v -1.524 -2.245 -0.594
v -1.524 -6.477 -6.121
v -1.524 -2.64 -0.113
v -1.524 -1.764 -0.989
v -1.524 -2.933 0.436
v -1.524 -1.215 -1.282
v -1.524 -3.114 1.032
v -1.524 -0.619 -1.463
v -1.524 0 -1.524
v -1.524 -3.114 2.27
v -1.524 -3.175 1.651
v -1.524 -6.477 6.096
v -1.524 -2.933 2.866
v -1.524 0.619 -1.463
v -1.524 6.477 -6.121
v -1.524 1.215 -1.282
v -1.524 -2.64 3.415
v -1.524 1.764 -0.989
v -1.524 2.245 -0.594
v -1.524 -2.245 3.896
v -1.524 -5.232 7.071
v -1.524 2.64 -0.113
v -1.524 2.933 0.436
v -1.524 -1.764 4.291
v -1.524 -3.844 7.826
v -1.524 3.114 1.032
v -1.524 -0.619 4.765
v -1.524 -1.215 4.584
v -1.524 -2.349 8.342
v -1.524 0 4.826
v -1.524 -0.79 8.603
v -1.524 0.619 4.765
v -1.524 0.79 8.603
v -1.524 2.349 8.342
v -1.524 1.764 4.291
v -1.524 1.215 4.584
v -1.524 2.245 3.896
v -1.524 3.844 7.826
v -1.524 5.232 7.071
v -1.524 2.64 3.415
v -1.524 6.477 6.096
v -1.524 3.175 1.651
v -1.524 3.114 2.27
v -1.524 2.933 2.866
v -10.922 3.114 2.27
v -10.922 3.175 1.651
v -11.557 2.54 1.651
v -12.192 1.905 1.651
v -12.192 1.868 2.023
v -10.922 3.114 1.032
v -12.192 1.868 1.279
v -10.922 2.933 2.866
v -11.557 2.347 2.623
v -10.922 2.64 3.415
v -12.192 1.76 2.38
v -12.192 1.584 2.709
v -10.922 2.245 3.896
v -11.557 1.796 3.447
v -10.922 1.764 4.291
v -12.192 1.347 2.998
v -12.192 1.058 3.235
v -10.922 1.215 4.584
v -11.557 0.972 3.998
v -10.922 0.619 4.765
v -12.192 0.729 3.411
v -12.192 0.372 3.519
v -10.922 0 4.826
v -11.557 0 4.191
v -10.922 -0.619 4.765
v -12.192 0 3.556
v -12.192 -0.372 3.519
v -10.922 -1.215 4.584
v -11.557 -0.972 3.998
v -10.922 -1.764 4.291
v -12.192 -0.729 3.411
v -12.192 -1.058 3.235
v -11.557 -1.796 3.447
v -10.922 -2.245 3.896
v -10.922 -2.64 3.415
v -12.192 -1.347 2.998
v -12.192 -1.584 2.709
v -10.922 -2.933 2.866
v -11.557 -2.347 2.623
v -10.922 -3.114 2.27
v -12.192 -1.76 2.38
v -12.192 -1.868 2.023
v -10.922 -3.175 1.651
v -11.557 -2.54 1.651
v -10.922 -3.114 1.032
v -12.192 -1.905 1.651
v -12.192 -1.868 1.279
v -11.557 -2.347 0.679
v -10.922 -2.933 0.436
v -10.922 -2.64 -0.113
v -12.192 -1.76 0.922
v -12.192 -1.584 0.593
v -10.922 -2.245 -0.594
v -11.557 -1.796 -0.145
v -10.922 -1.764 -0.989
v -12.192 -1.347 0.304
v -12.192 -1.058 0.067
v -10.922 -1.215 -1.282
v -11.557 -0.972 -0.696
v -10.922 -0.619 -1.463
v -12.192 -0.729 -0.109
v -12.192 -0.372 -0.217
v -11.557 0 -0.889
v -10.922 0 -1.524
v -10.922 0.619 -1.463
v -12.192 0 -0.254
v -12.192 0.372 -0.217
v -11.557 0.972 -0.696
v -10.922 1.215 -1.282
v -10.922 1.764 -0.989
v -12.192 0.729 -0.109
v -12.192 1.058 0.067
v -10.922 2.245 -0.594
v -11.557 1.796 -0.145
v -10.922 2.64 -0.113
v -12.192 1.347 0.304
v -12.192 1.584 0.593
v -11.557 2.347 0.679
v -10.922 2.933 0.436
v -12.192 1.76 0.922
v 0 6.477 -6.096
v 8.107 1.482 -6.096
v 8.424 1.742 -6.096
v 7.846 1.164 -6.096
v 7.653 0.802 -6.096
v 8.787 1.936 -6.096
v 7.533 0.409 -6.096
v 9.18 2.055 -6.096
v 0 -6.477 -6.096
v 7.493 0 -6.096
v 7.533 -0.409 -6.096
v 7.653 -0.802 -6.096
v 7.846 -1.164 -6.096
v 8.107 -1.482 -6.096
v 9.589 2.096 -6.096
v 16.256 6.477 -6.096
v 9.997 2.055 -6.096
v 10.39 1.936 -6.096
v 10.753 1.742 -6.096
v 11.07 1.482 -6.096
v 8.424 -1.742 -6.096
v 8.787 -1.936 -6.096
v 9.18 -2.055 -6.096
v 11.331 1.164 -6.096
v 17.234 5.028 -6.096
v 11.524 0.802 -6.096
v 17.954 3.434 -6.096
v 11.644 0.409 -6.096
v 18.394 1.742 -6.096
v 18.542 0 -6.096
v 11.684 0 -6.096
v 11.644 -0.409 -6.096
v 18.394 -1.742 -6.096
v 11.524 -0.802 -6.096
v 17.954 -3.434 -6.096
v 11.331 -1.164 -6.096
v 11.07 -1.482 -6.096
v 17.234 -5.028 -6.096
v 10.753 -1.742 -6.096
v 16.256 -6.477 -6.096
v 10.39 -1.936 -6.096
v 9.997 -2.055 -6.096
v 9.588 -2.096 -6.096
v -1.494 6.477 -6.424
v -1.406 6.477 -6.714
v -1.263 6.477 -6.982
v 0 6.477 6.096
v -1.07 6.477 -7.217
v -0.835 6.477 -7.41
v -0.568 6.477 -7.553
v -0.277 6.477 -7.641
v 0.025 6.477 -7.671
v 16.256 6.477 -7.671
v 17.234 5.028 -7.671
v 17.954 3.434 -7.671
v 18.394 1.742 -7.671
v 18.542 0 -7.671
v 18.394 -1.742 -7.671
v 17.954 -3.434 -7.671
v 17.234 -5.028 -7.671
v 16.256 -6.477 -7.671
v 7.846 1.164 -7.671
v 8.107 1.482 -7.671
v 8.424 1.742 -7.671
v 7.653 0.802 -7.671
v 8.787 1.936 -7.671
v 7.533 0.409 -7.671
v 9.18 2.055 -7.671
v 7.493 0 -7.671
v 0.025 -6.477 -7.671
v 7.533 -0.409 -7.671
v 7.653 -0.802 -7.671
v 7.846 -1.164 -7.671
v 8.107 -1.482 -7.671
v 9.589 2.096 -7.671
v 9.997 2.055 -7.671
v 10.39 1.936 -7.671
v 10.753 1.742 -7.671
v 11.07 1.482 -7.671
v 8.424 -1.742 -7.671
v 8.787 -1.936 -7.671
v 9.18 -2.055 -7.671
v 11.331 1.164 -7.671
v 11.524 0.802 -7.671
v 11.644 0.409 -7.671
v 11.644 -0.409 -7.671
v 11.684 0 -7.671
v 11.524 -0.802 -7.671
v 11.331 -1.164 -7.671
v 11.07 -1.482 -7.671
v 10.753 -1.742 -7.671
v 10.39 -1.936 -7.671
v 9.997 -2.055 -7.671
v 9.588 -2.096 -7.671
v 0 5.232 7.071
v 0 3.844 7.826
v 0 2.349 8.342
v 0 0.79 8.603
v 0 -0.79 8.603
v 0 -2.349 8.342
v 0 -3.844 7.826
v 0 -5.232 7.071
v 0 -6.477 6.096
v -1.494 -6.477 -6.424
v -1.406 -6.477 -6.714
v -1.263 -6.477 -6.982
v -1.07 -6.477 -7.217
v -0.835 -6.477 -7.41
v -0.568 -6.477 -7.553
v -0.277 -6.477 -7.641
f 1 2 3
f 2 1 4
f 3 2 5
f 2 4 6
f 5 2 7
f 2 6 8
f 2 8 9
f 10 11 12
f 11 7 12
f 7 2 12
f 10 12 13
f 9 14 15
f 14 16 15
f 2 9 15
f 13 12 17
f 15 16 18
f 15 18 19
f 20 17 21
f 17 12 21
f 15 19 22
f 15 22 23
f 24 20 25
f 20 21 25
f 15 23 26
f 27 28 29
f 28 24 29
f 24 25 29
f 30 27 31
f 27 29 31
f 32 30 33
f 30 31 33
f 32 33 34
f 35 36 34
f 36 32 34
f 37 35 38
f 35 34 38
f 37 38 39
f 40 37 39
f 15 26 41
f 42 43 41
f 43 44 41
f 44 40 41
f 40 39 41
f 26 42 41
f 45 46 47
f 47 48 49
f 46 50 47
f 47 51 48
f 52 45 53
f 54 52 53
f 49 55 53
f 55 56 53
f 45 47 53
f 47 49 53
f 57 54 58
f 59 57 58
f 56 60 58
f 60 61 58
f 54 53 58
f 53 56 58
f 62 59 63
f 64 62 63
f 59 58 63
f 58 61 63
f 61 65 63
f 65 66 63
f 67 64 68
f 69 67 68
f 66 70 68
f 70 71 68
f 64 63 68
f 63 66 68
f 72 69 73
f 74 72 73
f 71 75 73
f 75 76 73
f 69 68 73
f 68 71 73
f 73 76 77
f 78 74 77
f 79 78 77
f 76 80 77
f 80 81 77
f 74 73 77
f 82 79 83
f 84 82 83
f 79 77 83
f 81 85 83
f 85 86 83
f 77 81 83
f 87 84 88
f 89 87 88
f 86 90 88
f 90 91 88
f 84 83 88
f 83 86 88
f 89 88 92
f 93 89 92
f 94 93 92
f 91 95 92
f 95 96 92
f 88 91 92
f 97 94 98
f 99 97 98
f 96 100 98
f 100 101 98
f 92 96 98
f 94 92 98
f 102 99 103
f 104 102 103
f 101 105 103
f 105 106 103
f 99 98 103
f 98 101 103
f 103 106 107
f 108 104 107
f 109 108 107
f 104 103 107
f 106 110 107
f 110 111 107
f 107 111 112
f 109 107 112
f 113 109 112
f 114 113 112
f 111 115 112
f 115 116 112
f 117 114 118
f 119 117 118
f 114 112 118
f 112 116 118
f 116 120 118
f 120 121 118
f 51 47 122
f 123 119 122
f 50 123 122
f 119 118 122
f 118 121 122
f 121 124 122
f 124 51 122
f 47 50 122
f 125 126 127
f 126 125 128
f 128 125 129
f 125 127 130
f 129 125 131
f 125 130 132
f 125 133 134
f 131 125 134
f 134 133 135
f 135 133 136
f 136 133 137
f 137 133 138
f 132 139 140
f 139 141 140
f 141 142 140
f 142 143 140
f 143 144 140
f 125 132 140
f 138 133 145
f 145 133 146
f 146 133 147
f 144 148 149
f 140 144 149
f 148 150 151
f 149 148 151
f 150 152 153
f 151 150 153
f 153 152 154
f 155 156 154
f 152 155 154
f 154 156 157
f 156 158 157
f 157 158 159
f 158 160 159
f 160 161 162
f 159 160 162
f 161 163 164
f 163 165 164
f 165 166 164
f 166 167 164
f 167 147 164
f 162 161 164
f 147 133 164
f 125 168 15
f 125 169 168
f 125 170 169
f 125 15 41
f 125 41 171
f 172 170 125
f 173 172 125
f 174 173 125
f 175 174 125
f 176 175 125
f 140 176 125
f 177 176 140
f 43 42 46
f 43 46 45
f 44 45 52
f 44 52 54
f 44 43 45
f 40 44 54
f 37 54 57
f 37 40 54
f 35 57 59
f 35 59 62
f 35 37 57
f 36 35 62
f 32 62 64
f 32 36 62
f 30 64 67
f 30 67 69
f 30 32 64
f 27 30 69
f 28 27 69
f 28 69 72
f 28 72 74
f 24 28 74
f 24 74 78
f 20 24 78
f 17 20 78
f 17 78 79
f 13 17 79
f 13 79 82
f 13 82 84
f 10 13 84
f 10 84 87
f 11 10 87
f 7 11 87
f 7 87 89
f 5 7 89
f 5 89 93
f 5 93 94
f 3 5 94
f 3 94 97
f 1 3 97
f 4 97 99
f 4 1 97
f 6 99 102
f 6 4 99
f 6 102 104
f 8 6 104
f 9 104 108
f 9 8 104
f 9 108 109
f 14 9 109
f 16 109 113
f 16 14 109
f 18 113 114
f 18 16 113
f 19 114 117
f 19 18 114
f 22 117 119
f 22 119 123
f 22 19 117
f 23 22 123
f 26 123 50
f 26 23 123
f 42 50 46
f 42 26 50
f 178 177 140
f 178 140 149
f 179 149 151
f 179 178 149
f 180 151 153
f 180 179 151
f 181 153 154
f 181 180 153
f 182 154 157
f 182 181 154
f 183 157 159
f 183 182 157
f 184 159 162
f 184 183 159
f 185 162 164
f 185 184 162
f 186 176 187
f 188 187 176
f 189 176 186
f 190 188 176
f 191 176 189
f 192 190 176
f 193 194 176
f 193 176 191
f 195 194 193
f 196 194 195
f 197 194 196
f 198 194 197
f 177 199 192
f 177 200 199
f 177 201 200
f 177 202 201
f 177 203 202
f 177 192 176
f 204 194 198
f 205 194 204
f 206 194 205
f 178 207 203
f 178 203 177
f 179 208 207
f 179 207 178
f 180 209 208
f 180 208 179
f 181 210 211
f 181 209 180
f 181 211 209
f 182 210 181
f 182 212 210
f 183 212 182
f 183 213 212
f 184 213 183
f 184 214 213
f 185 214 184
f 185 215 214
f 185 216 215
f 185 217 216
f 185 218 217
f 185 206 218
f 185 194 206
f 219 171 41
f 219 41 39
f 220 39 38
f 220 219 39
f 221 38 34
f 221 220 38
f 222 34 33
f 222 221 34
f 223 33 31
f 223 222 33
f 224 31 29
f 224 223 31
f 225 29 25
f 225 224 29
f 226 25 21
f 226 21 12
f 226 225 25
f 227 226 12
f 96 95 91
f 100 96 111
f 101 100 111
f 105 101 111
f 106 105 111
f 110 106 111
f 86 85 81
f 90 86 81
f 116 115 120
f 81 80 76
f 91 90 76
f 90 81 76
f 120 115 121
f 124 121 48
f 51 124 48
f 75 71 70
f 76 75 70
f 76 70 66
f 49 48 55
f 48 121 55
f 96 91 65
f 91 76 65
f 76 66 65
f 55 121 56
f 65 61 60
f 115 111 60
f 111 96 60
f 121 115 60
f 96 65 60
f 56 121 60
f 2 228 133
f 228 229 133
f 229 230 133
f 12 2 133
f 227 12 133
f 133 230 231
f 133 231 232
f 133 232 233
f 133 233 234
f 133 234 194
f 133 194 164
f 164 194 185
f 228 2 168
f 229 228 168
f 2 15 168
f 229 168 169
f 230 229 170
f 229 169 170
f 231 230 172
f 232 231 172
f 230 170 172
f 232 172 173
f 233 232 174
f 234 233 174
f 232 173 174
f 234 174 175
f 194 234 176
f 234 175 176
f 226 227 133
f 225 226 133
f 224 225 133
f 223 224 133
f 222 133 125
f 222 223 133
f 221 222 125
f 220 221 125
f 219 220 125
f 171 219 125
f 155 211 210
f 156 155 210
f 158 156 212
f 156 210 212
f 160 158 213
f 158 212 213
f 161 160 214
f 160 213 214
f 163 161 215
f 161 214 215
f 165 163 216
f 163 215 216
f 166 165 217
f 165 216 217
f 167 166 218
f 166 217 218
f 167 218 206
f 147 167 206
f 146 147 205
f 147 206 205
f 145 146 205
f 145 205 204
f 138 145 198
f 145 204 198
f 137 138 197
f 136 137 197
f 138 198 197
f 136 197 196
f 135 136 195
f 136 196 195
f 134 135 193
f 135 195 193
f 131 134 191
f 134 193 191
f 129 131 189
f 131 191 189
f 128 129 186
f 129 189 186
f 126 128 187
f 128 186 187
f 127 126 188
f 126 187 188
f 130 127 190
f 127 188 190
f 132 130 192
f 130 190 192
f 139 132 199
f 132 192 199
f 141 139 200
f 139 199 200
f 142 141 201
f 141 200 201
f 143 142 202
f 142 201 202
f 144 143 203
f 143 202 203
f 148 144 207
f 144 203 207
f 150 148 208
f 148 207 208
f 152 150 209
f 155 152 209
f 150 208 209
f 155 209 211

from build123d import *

# Parameters (mm, degrees)
F0_W     = 12.954
F0_H     = 12.192
F0_R     = 3.175
F0_H_2   = 1.5748
F1_DEPTH = 1.524
F2_DEPTH = 12.192
F3_SIZE  = 1.27
F5_W     = 16.256
F5_H     = 12.954
F5_R     = 2.0955
F6_DEPTH = 1.5748
F7_R     = 1.5494


# Not quite as in the source:
# - a feature names something its author has since deleted; it is built from what else it names


with BuildPart() as f1:
    # F0 (on Right) → F1 (new body)
    with BuildSketch(Plane.YZ):
        with BuildLine():
            ThreePointArc((6.477, 6.096), (0, 8.636), (-6.477, 6.096))
            Line((-6.477, 6.096), (6.477, 6.096))
        make_face()
        Rectangle(F0_W, F0_H)
        with Locations((0, 1.651)):
            Circle(F0_R, mode=Mode.SUBTRACT)
        with Locations((0, -6.8834)):
            Rectangle(F0_W, F0_H_2)
        with Locations((0, 1.651)):
            Circle(F0_R)
    extrude(amount=-F1_DEPTH)

    # F0 (on Right) → F2 (join)
    with BuildSketch(Plane.YZ):
        with Locations((0, 1.651)):
            Circle(F0_R)
    extrude(amount=-F2_DEPTH)

    # F3
    f3_edges = [f1.edges().sort_by_distance(p)[0] for p in [
        (-12.192, -3.175, 1.651),
    ]]
    chamfer(f3_edges, length=F3_SIZE)

    # F5 (on offset) → F6 (join)
    with BuildSketch(Plane(origin=(0, 0, -7.6708), x_dir=(1, 0, 0), z_dir=(0, 0, -1))):
        with Locations((8.128, 0)):
            Rectangle(F5_W, F5_H)
        with Locations((9.5885, 0)):
            Circle(F5_R, mode=Mode.SUBTRACT)
        with BuildLine():
            Line((16.256, 6.477), (16.256, -6.477))
            ThreePointArc((16.256, -6.477), (18.542, 0), (16.256, 6.477))
        make_face()
    extrude(amount=-F6_DEPTH)

    # F7
    f7_edges = [f1.edges().sort_by_distance(p)[0] for p in [
        (-1.524, 0, -7.6708),
    ]]
    fillet(f7_edges, radius=F7_R)


solid = f1.part
